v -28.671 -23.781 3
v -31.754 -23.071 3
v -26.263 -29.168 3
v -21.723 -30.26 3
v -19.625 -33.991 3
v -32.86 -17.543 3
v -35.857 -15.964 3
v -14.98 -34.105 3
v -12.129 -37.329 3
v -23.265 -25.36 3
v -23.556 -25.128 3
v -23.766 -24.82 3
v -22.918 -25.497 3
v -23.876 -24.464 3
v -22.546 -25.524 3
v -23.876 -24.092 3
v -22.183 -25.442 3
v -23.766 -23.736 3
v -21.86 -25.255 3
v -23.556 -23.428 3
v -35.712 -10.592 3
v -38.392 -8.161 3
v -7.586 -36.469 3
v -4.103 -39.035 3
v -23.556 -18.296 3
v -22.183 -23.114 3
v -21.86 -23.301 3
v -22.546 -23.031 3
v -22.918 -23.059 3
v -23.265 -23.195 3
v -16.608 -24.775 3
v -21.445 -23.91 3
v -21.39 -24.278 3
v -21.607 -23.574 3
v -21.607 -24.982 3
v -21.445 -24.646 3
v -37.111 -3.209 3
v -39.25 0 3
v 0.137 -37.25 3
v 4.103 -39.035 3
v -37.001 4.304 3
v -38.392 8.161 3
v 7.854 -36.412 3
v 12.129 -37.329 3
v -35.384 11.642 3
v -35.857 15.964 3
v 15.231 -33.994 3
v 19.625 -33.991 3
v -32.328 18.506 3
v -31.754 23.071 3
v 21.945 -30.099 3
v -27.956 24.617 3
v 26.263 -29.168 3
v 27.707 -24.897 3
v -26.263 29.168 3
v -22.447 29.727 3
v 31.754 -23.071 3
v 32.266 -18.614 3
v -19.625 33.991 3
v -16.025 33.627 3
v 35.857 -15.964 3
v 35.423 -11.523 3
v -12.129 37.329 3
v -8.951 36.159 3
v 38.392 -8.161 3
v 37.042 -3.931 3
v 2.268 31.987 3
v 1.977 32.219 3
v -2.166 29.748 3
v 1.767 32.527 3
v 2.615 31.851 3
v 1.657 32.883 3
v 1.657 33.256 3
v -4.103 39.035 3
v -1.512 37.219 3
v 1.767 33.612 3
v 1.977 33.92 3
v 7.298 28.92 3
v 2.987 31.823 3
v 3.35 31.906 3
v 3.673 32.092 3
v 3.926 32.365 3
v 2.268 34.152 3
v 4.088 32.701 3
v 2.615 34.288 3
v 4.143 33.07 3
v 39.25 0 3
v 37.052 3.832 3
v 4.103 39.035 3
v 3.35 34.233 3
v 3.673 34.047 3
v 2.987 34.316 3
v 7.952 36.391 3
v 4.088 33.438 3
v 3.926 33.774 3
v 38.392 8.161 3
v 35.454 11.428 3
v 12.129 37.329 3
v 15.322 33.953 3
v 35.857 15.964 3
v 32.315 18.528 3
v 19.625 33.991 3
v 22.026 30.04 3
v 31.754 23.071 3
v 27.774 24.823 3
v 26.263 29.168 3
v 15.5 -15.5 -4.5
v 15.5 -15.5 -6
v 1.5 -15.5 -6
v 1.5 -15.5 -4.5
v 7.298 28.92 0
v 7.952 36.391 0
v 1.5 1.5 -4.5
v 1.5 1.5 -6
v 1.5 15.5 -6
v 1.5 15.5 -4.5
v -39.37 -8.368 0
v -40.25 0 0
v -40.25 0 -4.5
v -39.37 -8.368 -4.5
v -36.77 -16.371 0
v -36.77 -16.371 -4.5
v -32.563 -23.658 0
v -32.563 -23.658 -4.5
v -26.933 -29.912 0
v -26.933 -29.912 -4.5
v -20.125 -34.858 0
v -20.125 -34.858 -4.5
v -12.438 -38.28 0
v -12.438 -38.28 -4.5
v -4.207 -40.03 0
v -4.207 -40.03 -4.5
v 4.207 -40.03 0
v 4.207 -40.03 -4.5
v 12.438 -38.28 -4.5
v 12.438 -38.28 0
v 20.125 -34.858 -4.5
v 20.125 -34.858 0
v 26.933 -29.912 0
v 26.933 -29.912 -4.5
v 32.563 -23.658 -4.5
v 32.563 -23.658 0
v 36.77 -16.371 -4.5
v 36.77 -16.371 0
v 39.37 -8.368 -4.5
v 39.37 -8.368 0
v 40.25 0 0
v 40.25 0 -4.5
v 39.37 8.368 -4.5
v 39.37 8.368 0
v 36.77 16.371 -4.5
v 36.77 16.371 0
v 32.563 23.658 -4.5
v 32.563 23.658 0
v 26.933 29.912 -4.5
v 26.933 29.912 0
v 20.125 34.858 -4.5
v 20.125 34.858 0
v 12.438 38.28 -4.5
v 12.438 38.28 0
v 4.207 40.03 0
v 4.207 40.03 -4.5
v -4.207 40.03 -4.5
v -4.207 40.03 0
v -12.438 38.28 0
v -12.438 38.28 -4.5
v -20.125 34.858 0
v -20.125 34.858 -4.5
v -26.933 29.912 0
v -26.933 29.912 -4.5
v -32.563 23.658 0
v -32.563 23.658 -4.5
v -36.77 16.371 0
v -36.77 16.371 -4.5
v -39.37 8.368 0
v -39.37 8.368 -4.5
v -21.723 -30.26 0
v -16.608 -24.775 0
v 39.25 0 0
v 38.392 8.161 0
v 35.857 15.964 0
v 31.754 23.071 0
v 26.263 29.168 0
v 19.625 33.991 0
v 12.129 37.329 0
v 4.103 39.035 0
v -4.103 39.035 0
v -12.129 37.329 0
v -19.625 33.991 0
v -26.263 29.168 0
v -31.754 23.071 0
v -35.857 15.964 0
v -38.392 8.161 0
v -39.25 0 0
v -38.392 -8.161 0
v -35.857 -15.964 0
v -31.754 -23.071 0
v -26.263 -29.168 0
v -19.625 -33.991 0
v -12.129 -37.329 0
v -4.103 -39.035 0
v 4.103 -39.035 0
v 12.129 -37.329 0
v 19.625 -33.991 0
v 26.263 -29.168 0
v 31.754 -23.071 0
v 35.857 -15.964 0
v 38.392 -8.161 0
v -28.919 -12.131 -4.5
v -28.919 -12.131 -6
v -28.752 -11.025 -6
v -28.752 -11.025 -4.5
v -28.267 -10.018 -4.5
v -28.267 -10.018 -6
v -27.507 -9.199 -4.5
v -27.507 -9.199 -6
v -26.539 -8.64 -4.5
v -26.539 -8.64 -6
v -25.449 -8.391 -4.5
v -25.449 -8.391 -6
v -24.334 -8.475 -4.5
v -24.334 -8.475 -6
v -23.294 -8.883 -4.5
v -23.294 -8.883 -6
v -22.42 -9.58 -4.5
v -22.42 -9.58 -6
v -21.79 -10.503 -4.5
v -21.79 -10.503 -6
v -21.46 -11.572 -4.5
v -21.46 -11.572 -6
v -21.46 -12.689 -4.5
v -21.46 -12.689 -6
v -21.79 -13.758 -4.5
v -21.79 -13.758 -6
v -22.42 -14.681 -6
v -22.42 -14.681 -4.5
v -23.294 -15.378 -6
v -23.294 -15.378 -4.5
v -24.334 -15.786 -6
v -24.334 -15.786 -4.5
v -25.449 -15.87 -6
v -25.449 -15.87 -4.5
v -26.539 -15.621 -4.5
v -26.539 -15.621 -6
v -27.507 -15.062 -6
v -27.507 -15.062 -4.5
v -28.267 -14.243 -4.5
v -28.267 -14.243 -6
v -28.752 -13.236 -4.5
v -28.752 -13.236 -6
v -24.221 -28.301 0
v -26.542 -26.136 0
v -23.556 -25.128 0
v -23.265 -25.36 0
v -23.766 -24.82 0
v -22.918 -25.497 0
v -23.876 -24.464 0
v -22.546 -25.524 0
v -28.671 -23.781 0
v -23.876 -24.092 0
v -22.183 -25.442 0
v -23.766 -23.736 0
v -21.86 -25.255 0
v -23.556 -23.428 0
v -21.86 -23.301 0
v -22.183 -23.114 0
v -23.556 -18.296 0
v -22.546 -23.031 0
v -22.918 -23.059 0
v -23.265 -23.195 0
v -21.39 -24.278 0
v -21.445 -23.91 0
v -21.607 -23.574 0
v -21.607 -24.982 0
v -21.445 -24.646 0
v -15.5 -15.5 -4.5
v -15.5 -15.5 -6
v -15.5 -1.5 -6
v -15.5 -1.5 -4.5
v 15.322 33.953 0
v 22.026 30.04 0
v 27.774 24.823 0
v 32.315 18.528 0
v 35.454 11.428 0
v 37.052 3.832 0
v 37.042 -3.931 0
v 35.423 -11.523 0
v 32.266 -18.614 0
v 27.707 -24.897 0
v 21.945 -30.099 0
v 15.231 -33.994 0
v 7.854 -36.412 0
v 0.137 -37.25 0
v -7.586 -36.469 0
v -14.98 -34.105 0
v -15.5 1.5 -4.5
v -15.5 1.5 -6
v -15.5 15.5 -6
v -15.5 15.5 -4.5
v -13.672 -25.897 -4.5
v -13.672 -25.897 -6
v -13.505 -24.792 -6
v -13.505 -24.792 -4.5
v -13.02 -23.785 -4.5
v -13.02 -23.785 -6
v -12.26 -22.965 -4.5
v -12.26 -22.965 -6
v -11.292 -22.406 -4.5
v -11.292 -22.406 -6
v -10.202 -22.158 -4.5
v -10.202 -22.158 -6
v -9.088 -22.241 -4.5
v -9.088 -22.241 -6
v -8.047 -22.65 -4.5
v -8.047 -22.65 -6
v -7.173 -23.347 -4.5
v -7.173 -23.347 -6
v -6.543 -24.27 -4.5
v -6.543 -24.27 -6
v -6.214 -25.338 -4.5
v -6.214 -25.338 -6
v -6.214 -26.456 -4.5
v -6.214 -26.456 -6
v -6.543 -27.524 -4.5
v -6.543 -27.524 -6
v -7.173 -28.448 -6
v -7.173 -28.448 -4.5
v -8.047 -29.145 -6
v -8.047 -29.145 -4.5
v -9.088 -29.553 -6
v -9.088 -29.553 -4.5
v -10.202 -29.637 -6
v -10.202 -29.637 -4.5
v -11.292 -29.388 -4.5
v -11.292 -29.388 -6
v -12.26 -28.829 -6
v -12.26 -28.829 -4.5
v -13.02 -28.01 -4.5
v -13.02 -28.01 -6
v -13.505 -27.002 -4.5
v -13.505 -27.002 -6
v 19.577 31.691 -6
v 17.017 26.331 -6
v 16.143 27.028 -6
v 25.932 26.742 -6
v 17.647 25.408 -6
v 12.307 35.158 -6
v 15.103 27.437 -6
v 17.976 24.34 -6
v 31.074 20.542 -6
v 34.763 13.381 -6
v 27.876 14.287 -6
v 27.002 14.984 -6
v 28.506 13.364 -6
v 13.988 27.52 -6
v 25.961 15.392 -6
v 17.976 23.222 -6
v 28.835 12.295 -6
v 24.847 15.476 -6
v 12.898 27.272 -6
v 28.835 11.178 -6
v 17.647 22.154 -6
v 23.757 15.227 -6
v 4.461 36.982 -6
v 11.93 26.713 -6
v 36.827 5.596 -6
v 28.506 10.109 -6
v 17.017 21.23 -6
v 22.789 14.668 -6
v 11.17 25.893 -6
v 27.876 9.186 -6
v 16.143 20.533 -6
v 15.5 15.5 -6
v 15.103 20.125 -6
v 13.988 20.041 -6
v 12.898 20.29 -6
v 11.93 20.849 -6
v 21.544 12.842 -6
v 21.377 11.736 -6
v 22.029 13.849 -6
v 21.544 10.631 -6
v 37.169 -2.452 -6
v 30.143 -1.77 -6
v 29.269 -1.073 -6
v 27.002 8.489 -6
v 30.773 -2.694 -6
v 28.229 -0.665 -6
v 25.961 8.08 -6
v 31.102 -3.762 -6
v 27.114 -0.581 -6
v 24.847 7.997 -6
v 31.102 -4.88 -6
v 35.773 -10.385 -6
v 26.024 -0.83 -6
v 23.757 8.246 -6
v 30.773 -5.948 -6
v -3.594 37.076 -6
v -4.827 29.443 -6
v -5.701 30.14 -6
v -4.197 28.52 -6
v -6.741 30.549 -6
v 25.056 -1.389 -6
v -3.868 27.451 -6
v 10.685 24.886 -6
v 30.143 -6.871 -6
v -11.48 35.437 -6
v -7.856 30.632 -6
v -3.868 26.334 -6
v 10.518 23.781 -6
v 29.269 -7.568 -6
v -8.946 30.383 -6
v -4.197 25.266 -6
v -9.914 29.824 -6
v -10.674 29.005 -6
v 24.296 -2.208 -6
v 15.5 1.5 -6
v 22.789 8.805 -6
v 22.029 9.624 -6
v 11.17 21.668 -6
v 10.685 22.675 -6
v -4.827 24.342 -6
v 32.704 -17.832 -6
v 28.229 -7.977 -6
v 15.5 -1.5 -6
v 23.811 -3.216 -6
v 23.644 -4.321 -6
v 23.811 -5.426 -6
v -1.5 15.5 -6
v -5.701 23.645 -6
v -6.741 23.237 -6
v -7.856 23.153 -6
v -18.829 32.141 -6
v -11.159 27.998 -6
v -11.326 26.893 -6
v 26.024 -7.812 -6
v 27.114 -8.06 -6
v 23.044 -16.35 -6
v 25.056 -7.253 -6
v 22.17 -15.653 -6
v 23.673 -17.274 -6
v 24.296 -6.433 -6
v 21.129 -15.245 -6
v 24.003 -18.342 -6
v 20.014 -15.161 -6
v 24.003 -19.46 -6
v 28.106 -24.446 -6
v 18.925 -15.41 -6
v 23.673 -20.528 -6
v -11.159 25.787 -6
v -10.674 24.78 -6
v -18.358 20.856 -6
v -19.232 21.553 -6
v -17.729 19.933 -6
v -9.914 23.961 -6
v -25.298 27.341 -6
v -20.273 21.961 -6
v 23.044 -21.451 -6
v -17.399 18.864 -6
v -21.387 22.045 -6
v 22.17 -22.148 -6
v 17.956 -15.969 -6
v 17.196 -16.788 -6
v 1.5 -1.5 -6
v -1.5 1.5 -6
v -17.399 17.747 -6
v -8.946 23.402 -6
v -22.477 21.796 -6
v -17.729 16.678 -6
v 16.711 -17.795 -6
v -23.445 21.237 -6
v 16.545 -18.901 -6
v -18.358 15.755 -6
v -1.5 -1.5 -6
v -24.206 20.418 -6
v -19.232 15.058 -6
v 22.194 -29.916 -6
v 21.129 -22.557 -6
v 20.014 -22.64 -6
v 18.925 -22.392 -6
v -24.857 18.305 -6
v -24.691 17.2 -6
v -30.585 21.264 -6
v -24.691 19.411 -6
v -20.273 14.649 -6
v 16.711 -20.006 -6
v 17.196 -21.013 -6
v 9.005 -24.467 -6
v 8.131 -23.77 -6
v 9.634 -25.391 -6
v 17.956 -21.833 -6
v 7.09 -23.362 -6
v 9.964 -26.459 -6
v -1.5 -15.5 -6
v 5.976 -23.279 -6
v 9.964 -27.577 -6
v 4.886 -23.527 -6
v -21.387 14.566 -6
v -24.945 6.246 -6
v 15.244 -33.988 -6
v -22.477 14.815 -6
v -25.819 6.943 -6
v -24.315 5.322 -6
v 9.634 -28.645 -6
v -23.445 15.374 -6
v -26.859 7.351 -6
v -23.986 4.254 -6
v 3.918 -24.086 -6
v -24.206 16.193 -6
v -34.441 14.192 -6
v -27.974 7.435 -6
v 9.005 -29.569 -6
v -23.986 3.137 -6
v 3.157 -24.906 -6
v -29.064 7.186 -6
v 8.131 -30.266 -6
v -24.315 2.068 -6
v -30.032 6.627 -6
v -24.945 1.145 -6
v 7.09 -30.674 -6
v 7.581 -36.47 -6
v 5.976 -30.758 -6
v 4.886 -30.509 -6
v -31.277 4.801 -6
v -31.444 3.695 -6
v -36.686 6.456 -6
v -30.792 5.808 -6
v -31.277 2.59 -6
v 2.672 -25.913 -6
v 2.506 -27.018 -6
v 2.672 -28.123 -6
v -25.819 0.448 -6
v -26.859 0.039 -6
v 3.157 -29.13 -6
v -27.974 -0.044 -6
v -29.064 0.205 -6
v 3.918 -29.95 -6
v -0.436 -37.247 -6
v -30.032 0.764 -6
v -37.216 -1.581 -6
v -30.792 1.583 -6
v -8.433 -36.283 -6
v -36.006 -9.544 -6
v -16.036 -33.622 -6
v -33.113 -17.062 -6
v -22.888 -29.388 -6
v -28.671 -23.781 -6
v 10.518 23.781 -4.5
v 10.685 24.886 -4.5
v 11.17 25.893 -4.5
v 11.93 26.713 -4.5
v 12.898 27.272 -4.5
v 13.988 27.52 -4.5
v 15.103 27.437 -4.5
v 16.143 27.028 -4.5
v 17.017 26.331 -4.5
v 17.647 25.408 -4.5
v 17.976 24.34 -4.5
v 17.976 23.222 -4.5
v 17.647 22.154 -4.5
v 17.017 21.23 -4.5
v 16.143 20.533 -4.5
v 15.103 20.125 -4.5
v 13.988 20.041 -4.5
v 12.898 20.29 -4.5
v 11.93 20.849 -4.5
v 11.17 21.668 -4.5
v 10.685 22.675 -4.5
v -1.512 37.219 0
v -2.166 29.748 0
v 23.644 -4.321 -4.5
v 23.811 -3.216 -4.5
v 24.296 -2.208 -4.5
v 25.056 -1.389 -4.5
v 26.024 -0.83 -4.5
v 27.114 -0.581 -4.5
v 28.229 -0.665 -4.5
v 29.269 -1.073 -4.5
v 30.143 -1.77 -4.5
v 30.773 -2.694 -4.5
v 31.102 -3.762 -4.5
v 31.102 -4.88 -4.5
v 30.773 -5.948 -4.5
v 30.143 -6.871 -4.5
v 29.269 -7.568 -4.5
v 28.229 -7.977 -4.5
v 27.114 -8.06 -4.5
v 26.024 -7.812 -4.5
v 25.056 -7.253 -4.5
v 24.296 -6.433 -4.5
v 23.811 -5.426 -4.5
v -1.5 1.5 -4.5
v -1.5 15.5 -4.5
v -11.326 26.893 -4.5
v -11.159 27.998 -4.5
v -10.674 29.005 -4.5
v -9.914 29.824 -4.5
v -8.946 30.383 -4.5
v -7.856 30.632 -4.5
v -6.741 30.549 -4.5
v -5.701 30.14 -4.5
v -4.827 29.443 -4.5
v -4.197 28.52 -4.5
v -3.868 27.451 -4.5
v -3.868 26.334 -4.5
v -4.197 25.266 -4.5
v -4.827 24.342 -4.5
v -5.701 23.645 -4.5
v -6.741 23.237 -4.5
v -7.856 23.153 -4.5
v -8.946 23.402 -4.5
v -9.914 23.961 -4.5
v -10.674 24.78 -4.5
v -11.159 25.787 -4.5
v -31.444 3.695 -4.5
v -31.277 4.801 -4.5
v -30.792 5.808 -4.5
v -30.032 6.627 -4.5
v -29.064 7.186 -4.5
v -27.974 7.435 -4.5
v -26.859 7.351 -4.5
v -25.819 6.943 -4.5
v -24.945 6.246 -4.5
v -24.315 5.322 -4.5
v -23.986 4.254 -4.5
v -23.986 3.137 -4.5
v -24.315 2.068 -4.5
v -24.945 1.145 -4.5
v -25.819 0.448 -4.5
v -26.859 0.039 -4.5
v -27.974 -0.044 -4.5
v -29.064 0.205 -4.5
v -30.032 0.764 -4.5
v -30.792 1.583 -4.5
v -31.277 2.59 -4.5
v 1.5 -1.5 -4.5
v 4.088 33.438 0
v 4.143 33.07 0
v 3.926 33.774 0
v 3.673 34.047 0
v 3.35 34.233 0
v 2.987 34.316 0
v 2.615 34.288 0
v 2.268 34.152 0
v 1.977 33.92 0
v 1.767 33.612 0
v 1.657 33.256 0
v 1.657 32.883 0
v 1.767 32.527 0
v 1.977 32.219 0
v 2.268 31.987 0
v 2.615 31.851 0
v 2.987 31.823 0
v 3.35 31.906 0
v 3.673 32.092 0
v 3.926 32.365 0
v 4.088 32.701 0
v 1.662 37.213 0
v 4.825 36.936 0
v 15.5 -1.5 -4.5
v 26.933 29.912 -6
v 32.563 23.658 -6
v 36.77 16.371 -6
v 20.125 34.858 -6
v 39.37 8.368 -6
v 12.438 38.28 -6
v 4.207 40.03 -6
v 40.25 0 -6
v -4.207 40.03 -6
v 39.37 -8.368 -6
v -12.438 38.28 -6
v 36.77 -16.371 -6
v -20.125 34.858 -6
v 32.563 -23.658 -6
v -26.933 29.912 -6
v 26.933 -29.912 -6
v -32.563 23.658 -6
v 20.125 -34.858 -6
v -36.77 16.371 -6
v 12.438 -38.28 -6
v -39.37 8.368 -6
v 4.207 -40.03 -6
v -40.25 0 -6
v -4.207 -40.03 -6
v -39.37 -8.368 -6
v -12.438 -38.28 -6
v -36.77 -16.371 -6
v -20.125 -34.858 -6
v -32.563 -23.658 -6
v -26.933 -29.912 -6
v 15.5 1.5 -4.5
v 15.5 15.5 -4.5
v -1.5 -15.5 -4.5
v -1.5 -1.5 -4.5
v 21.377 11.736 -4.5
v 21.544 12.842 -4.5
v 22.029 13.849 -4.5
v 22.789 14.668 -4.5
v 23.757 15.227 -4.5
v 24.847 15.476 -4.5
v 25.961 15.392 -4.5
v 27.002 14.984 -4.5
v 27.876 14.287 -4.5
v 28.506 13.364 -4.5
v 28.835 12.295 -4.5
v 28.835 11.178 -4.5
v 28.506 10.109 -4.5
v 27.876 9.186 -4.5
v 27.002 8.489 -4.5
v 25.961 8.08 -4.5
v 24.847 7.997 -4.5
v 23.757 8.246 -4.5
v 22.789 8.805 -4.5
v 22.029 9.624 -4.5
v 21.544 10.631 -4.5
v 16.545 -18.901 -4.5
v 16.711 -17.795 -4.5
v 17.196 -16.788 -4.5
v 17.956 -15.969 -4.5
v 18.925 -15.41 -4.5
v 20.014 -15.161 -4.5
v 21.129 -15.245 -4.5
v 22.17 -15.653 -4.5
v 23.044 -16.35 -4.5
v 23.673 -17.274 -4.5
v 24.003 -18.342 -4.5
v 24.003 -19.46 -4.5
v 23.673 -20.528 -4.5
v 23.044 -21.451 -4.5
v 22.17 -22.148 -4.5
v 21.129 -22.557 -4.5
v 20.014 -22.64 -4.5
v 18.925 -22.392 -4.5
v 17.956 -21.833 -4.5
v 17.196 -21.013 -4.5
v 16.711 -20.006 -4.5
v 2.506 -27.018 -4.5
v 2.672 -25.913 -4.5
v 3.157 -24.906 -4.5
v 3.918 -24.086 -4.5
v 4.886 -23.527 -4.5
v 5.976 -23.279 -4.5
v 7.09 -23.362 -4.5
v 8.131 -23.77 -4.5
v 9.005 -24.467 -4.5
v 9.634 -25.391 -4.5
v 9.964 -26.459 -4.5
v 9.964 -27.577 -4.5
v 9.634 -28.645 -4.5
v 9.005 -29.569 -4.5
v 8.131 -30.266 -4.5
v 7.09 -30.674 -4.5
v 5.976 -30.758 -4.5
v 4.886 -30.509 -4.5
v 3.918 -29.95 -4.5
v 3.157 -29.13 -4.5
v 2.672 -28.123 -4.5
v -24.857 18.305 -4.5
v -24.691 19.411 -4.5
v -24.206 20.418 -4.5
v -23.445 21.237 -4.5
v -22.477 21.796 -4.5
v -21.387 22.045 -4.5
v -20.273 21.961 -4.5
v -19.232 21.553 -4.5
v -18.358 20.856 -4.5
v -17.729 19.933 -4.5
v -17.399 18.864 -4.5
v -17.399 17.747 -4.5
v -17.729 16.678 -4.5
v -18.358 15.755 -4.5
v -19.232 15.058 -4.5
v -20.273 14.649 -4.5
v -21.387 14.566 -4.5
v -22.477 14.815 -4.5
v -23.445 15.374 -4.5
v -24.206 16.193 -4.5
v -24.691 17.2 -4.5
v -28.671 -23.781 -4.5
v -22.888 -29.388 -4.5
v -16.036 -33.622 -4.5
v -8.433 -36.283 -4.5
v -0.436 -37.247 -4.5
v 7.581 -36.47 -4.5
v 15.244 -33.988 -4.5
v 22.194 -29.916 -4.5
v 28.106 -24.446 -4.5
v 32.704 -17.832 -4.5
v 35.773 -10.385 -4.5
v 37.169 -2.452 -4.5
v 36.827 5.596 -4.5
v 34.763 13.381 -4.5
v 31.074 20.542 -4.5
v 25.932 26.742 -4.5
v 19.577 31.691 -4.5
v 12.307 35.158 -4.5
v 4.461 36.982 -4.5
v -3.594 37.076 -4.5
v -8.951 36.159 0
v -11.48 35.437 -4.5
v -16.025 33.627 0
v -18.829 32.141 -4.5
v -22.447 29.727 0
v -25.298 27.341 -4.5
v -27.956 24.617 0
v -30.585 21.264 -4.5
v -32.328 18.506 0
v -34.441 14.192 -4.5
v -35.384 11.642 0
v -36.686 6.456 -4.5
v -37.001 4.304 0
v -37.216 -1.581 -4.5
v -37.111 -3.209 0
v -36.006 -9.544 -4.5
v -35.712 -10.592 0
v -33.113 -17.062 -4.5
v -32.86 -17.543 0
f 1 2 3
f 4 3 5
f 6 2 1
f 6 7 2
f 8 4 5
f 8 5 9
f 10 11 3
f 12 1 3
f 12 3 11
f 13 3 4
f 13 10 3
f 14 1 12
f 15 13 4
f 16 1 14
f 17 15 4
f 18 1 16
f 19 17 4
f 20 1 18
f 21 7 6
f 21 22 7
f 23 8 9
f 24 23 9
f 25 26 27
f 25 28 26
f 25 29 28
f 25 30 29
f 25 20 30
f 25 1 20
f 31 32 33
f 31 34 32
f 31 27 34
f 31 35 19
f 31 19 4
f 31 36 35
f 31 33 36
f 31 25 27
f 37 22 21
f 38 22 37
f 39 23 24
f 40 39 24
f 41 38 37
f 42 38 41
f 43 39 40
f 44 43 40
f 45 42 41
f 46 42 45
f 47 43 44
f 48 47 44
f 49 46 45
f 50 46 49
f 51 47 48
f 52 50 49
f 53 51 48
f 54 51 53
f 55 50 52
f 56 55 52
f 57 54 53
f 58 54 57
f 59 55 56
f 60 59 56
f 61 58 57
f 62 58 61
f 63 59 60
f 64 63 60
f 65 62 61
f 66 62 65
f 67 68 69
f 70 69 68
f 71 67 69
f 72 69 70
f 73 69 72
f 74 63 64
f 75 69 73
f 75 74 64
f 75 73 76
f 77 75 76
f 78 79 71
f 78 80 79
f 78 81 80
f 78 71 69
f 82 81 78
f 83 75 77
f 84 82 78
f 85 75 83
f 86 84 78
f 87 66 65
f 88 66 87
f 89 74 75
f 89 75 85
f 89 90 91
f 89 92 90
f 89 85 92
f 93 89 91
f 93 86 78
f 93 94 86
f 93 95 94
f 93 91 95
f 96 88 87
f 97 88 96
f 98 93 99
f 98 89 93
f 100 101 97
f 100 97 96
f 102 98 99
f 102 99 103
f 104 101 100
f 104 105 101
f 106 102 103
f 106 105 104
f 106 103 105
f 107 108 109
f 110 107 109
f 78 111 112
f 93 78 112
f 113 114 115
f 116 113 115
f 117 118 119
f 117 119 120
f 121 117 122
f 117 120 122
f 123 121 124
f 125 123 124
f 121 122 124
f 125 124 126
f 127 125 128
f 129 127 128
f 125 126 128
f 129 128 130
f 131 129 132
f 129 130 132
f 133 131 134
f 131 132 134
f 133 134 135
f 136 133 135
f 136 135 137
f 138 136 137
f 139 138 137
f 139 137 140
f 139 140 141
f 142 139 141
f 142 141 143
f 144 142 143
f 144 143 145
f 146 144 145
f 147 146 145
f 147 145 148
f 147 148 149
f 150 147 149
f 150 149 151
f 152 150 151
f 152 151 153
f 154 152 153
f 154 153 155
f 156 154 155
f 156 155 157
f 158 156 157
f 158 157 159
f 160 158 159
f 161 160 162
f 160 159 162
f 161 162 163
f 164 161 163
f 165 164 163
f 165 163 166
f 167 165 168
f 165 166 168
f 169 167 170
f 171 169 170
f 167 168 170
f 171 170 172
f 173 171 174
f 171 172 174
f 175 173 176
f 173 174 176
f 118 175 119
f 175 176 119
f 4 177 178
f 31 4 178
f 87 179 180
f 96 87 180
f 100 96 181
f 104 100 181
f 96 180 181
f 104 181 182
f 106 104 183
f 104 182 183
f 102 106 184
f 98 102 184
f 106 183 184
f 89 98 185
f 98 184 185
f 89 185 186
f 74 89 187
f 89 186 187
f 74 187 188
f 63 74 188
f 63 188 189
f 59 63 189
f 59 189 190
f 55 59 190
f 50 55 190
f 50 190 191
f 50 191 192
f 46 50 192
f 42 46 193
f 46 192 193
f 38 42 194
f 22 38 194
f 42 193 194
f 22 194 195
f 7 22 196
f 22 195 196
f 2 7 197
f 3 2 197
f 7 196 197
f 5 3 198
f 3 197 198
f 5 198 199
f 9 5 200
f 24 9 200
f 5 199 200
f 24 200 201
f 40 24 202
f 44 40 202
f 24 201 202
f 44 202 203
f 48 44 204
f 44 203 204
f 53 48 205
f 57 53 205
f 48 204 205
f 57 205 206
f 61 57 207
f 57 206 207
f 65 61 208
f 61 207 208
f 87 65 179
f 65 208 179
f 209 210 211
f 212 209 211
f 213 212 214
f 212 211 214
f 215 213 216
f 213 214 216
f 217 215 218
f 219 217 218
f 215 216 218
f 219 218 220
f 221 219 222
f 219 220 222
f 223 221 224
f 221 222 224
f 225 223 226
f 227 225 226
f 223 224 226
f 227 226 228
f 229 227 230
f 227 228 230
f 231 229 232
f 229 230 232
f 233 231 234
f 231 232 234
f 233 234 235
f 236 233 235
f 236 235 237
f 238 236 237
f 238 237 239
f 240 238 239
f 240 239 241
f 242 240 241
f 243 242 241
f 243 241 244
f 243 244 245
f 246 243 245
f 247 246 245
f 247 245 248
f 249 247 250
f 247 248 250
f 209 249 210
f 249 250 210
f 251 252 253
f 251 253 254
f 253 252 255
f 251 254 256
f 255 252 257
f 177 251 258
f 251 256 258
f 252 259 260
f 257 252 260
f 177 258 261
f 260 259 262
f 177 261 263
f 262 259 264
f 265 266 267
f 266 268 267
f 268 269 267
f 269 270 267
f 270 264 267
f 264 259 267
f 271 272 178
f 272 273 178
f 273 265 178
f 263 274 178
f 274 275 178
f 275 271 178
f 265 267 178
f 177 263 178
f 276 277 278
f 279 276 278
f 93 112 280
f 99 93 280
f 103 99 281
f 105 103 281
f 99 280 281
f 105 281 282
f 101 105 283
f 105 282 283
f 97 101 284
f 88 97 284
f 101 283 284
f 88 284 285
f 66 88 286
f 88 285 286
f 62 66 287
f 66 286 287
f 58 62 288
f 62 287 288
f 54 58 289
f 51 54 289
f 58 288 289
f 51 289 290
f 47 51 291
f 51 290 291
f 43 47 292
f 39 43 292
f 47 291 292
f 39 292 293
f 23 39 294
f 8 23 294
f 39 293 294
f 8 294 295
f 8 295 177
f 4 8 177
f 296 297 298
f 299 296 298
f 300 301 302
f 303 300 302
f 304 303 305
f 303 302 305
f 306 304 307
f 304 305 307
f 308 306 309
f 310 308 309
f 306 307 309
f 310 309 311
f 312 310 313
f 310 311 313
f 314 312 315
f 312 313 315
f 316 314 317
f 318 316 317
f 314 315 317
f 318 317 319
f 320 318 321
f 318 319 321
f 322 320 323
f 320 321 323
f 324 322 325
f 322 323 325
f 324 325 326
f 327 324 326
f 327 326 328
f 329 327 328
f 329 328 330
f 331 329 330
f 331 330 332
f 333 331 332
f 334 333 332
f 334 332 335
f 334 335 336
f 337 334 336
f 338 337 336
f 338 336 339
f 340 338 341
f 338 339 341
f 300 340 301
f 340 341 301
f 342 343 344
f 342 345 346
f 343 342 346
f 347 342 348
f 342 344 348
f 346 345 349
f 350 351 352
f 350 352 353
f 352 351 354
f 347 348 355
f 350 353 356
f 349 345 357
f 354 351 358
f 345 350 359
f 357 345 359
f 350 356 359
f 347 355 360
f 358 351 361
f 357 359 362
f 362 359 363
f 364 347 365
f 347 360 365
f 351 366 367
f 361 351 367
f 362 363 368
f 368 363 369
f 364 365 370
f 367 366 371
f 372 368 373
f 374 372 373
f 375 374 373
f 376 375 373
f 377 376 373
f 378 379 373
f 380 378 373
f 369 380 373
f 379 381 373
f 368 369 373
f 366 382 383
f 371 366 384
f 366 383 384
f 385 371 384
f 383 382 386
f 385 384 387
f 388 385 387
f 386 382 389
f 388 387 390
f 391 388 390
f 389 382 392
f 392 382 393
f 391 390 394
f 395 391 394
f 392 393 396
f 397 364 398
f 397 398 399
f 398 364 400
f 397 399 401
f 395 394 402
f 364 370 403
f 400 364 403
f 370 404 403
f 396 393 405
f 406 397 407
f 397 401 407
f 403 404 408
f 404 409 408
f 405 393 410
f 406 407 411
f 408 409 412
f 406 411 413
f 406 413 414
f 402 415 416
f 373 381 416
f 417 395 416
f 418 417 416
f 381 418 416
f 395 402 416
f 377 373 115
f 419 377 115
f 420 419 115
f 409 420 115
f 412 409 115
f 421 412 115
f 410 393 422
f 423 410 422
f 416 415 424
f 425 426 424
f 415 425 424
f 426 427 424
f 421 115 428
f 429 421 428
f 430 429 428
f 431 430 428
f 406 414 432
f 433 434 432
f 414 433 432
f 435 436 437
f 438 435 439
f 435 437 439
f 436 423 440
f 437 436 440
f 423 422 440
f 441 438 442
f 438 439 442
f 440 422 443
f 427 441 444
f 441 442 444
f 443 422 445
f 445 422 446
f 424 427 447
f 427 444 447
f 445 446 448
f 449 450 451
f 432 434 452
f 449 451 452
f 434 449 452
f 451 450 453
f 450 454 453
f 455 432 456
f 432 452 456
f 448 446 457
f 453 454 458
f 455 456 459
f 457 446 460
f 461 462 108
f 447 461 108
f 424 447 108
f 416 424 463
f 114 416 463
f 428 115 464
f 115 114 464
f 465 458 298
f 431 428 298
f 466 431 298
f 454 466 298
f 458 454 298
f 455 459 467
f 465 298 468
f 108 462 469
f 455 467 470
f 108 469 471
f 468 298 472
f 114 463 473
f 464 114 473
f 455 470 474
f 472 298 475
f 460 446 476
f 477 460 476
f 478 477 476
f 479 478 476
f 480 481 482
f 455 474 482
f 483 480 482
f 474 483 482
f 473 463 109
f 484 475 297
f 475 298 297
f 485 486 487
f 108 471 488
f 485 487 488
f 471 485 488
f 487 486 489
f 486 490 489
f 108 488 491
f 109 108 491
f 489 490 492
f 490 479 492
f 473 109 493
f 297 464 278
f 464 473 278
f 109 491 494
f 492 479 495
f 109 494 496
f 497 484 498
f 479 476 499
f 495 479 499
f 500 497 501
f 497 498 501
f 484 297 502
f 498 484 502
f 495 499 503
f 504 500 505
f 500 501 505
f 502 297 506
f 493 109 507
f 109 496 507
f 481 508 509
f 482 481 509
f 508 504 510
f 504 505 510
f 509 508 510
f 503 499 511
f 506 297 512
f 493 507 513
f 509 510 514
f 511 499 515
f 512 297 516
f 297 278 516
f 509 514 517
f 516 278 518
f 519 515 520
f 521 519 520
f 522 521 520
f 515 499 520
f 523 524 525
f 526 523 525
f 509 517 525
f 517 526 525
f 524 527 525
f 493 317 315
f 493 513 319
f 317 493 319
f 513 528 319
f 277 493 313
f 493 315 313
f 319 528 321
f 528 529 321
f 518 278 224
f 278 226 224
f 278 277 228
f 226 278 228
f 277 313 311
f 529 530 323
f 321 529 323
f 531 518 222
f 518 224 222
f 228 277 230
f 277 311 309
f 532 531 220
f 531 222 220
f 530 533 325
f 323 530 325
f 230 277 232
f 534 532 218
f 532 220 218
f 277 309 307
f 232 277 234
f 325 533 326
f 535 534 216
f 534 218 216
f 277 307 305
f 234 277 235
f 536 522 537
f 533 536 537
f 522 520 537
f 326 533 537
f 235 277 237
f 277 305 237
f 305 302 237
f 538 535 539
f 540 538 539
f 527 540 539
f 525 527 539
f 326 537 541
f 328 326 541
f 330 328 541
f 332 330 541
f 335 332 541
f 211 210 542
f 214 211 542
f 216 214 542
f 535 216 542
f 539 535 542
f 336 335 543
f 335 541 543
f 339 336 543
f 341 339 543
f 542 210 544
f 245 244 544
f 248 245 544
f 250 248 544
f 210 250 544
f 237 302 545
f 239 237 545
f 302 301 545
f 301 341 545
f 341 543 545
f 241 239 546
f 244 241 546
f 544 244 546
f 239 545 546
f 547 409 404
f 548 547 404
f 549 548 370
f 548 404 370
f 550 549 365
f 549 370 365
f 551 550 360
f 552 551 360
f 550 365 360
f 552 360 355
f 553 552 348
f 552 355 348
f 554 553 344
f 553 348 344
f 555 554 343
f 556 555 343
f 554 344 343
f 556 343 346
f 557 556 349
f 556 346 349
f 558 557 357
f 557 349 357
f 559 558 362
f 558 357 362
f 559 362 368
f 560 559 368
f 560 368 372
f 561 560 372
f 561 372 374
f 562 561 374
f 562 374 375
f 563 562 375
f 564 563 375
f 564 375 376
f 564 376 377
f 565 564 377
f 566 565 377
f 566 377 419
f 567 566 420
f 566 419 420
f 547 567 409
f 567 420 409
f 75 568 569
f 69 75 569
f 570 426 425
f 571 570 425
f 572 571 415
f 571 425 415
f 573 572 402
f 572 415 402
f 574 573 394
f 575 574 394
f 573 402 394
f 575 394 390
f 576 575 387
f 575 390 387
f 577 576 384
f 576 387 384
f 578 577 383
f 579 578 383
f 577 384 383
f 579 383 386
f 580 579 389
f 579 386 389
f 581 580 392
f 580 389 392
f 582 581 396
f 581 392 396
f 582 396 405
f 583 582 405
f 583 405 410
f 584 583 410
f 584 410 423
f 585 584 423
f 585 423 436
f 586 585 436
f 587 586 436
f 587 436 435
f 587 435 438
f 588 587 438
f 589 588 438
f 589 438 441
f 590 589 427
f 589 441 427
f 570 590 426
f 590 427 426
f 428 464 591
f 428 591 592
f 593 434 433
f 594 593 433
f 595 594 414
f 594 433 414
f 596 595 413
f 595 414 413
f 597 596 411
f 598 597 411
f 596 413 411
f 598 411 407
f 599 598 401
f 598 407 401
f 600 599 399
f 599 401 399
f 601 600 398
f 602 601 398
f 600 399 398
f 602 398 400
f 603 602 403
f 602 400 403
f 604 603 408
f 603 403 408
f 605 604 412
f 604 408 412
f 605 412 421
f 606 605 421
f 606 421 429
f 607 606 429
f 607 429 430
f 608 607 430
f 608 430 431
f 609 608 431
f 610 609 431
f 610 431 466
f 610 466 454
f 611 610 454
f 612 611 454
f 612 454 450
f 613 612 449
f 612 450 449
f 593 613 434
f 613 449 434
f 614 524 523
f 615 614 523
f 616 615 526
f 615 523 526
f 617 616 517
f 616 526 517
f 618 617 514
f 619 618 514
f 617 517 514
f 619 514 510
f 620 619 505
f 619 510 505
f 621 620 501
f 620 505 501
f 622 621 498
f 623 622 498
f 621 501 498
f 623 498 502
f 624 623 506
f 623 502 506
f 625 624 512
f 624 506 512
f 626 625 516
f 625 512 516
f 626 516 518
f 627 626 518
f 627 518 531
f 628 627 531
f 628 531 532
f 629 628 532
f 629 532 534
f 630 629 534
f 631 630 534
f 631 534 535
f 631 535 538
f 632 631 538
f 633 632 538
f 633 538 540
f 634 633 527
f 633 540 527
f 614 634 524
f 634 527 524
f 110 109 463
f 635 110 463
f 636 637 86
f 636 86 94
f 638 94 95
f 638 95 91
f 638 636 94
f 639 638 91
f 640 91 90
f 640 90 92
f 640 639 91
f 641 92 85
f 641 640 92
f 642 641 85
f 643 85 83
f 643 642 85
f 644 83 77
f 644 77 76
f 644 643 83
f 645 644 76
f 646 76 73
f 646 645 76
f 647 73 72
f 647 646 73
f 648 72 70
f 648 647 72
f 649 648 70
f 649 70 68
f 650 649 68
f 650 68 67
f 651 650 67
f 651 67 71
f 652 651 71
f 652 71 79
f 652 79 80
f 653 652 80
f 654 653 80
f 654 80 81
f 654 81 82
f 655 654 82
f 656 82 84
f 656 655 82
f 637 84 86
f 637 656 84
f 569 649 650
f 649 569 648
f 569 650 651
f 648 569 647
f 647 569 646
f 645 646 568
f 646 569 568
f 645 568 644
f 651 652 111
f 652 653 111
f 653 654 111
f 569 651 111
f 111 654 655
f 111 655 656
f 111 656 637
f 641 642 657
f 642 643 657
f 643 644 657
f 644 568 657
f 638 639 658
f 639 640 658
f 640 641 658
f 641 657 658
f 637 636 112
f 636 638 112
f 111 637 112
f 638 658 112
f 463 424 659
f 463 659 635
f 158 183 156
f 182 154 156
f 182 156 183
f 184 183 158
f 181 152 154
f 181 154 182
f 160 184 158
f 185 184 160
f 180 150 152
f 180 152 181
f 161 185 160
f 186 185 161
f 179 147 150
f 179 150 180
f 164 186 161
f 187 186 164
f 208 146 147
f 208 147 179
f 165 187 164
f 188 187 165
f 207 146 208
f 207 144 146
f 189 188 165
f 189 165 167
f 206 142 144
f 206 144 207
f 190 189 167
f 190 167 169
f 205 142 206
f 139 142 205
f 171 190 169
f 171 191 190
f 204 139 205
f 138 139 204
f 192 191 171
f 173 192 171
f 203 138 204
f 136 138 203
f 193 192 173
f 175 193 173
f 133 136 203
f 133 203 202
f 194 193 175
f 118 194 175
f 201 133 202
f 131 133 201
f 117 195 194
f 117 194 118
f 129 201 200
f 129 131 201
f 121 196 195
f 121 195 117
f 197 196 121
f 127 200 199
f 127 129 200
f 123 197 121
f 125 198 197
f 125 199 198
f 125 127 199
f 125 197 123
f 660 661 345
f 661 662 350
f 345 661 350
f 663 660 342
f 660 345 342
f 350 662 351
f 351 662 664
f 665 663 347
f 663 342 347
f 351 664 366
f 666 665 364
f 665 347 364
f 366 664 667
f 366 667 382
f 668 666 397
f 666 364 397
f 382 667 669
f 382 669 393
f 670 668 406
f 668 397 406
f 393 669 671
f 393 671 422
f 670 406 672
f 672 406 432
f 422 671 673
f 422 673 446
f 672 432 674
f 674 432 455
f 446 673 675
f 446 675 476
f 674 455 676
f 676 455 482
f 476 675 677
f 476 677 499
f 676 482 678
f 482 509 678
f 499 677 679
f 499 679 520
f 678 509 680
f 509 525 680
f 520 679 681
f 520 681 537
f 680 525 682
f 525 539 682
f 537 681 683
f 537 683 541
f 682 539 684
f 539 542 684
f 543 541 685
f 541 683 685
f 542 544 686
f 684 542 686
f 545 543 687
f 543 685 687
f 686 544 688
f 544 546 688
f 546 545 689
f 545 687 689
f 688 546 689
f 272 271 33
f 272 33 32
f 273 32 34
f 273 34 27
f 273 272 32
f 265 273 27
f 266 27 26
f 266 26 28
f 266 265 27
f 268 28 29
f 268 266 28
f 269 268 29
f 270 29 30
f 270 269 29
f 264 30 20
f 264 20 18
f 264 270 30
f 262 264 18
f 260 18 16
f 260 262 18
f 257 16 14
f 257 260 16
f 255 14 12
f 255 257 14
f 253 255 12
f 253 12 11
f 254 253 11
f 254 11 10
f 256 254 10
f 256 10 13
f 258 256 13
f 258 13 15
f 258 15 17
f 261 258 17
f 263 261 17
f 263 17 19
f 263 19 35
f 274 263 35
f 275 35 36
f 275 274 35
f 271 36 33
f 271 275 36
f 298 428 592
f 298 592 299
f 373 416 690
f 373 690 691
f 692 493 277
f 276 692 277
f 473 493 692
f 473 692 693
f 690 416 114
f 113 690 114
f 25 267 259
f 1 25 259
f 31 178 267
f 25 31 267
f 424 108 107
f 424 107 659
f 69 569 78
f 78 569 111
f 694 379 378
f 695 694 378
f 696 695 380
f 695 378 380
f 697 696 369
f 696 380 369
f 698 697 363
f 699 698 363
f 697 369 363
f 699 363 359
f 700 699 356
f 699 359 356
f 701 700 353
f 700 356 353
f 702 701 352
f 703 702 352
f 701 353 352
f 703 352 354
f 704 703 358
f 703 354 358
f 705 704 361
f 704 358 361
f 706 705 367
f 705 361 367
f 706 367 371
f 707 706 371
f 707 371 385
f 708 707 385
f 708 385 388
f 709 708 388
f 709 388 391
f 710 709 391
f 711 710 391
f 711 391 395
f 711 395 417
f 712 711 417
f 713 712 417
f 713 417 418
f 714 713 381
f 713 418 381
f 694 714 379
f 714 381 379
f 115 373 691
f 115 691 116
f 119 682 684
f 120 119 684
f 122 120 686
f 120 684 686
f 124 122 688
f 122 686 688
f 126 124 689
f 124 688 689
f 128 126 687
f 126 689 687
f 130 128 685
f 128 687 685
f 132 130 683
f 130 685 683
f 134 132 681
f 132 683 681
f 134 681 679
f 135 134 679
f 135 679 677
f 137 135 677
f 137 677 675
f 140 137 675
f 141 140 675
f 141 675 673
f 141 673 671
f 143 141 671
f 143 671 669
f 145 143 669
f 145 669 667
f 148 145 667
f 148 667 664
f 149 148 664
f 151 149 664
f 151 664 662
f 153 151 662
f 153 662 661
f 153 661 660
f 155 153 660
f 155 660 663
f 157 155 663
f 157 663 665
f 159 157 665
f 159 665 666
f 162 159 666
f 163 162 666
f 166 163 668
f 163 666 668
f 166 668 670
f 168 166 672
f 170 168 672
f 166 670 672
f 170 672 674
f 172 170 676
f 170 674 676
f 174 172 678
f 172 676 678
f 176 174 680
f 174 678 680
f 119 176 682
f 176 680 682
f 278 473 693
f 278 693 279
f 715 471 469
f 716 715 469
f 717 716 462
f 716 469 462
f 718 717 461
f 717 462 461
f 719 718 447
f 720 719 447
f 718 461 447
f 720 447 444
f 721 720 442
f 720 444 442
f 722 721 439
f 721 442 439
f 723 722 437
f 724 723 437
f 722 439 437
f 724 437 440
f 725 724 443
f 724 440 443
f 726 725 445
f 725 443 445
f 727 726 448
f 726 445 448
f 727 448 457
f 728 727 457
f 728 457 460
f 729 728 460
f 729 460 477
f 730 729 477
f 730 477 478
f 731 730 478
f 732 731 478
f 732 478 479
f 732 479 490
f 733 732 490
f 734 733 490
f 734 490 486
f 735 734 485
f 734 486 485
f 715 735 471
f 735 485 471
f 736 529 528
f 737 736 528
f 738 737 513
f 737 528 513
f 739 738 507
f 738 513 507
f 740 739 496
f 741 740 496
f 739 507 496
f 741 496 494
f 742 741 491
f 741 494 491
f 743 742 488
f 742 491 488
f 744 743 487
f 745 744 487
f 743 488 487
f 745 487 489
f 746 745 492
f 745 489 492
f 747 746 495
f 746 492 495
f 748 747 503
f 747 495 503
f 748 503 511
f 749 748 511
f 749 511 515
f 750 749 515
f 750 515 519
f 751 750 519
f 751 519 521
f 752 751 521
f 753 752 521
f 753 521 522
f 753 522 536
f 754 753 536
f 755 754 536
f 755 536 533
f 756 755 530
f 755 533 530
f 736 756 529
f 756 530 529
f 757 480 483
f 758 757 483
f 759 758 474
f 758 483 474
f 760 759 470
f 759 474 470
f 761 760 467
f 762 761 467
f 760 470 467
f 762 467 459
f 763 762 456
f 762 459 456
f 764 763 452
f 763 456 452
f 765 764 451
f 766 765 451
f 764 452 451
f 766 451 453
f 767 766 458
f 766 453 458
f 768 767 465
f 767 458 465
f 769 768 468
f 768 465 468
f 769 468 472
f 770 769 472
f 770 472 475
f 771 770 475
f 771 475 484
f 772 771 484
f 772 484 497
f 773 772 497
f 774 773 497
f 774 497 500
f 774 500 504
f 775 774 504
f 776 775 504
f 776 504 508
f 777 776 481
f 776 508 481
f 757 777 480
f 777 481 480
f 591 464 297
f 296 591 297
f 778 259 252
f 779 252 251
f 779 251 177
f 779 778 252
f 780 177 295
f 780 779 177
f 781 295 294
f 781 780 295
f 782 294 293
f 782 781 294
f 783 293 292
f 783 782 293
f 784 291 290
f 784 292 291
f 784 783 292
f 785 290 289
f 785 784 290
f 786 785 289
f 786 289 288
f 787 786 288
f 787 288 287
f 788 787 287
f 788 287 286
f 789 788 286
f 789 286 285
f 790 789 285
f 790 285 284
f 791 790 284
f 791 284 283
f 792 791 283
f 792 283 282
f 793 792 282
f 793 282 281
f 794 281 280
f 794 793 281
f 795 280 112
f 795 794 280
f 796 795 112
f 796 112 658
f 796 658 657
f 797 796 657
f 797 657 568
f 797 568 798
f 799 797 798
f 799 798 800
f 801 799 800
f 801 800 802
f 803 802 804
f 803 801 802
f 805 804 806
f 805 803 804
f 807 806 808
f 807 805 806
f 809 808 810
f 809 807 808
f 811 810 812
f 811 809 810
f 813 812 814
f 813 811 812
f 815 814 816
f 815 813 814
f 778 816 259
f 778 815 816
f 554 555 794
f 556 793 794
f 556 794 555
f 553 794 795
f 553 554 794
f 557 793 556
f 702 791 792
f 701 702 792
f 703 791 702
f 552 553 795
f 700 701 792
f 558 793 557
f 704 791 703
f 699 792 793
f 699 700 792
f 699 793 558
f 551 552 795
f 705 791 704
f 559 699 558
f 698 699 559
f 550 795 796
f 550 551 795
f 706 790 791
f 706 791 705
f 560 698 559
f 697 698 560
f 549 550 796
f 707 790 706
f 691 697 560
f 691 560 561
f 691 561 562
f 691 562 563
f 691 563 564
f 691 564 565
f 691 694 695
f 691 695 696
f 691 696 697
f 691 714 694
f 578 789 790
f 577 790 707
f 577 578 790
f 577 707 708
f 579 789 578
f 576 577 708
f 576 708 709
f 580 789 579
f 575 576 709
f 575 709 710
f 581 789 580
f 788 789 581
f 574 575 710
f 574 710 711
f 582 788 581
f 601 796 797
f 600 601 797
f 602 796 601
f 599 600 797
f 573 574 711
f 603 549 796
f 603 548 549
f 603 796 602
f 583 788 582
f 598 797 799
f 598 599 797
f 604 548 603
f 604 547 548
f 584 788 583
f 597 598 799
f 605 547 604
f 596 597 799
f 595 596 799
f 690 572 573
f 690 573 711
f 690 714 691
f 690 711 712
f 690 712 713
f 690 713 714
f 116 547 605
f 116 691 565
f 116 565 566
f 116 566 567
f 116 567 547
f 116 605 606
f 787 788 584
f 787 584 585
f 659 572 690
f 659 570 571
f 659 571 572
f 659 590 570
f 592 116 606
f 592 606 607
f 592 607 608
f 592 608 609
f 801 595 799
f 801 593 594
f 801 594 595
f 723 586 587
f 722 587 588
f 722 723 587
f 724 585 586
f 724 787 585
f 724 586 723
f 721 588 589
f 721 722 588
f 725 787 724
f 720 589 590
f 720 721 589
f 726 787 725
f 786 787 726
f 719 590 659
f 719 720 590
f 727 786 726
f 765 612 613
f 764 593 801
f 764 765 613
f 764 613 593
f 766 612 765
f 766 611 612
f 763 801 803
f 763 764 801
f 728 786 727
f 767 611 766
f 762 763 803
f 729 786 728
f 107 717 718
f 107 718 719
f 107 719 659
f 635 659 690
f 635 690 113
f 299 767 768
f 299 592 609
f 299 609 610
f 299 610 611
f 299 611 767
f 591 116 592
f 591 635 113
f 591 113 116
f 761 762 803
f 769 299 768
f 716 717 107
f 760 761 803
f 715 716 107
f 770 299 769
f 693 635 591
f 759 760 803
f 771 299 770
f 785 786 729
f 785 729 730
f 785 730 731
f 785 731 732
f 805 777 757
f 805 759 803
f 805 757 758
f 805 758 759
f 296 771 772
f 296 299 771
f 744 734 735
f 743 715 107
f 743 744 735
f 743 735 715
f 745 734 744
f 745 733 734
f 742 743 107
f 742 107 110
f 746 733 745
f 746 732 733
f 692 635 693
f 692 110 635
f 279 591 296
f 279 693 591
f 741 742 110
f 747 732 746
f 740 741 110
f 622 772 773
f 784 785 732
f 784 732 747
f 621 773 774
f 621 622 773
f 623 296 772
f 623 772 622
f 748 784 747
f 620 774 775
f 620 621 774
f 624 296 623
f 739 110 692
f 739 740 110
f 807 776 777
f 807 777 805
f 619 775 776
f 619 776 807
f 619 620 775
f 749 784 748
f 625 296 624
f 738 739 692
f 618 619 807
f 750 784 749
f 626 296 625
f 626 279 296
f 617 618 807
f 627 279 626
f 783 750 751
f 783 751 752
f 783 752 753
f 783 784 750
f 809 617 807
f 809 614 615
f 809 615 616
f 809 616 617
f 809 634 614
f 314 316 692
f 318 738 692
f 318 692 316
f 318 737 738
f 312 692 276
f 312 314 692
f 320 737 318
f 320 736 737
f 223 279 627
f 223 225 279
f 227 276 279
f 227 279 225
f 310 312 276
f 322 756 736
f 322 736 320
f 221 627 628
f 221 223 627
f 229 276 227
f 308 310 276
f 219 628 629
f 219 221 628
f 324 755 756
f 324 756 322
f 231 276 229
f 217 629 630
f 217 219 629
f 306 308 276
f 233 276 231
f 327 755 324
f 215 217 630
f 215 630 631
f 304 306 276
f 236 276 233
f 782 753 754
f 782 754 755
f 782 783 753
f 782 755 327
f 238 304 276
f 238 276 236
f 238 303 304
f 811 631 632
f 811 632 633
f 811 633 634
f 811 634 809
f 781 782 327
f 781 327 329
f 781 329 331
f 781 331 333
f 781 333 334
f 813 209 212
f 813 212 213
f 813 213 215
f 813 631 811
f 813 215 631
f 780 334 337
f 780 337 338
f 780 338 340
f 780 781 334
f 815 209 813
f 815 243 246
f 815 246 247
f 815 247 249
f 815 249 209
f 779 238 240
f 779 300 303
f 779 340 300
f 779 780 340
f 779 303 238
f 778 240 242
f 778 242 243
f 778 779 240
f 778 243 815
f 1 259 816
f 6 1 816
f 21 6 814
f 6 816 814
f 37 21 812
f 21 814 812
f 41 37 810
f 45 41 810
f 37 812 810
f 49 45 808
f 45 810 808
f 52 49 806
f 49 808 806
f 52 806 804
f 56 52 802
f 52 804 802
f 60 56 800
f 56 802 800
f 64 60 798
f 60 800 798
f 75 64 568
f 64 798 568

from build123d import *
from build123d.topology import SkipClean

# Parameters (mm, degrees)
SKETCH2_R           = 39.25
SKETCH2_R_2         = 1.25
BOSS_EXTRUDE1_DEPTH = 3
BOSS_EXTRUDE2_START = -6
SKETCH3_R           = 40.25
SKETCH3_R_2         = 37.25
SKETCH3_R_3         = 1.25
BOSS_EXTRUDE2_DEPTH = 6
SKETCH4_R           = 40.25
BOSS_EXTRUDE3_DEPTH = 1.5
SKETCH5_W           = 14
SKETCH5_H           = 14
CUT_EXTRUDE1_DEPTH  = 1.5
SKETCH7_R           = 3.75
CUT_EXTRUDE2_DEPTH  = 1.5


with BuildPart() as part:
    # Sketch2 → Boss-Extrude1 (new body)
    with BuildSketch(Plane(origin=(0, 0, 0), x_dir=(0, 1, 0), z_dir=(0, 0, 1))):
        with Locations(Location((0, 0, 0), (0, 0, 270))):
            Circle(SKETCH2_R)
        with BuildLine():
            Line((-18.29588, 23.55599), (-23.781033, 28.670978))
            ThreePointArc((-23.781033, 28.670978), (15.15094, 34.029568), (37.219306, 1.511877))
            Line((37.219306, 1.511877), (29.747846, 2.165545))
            Line((29.747846, 2.165545), (28.919866, -7.298305))
            Line((28.919866, -7.298305), (36.391326, -7.951973))
            ThreePointArc((36.391326, -7.951973), (-15.15094, -34.029568), (-30.260018, 21.723117))
            Line((-30.260018, 21.723117), (-24.774865, 16.60813))
            Line((-24.774865, 16.60813), (-18.29588, 23.55599))
        make_face(mode=Mode.SUBTRACT)
        with Locations(Location((-24.277949, 22.639554, 0), (0, 0, 270))):
            Circle(SKETCH2_R_2, mode=Mode.SUBTRACT)
        with Locations(Location((33.069586, -2.893214, 0), (0, 0, 270))):
            Circle(SKETCH2_R_2, mode=Mode.SUBTRACT)
    extrude(amount=BOSS_EXTRUDE1_DEPTH)

    # Sketch3 → Boss-Extrude2 (add)
    # profile 1 of 3: a face of its own
    with SkipClean():  # the faces are left unmerged after this step: merging them gives an invalid solid
        with BuildSketch(Plane.XY.offset(BOSS_EXTRUDE2_START)):
            with Locations(Location((0, 0, 0), (0, 0, 180))):
                Circle(SKETCH3_R)
            with Locations(Location((0, 0, 0), (0, 0, 219.67388))):
                Circle(SKETCH3_R_2, mode=Mode.SUBTRACT)
        # profile 2 of 3: a face of its own
        with BuildSketch(Plane.XY.offset(BOSS_EXTRUDE2_START)):
            with Locations((2.893214, 33.069586)):
                Circle(SKETCH3_R_3)
        # profile 3 of 3: a face of its own
        with BuildSketch(Plane.XY.offset(BOSS_EXTRUDE2_START)):
            with Locations((-22.639554, -24.277949)):
                Circle(SKETCH3_R_3)
        extrude(amount=BOSS_EXTRUDE2_DEPTH)


with BuildPart() as boss_extrude2_kept_piece:
    # of the separate pieces the step leaves, the one the design keeps (boss_extrude2_pieces_kept)
    add(part.part.solids().sort_by_distance((39.25, 0, 0))[0])

    # Sketch4 → Boss-Extrude3 (add)
    with SkipClean():  # the faces are left unmerged after this step: merging them gives an invalid solid
        with BuildSketch(Plane.XY.offset(-6)):
            with Locations(Location((0, 0, 0), (0, 0, 180))):
                Circle(SKETCH4_R)
        extrude(amount=BOSS_EXTRUDE3_DEPTH)

    # Sketch5 → Cut-Extrude1 (cut)
    with SkipClean():  # the faces are left unmerged after this step: merging them gives an invalid solid
        with BuildSketch(Plane(origin=(0, 0, -6), x_dir=(-1, 0, 0), z_dir=(0, 0, -1))):
            with Locations((-8.5, -8.5)):
                Rectangle(SKETCH5_W, SKETCH5_H)
            with Locations((-8.5, 8.5)):
                Rectangle(SKETCH5_W, SKETCH5_H)
            with Locations((8.5, 8.5)):
                Rectangle(SKETCH5_W, SKETCH5_H)
            with Locations((8.5, -8.5)):
                Rectangle(SKETCH5_W, SKETCH5_H)
        extrude(amount=-CUT_EXTRUDE1_DEPTH, mode=Mode.SUBTRACT)

    # Sketch7 → Cut-Extrude2 (cut)
    with SkipClean():  # the faces are left unmerged after this step: merging them gives an invalid solid
        with BuildSketch(Plane(origin=(0, 0, -6), x_dir=(-1, 0, 0), z_dir=(0, 0, -1))):
            with Locations((-25.126958, 11.736458)):
                Circle(SKETCH7_R)
            with Locations((-27.394136, -4.320851)):
                Circle(SKETCH7_R)
            with Locations((-20.294579, -18.900755)):
                Circle(SKETCH7_R)
            with Locations((-6.2558, -27.01802)):
                Circle(SKETCH7_R)
            with Locations((9.921992, -25.897153)):
                Circle(SKETCH7_R)
            with Locations((25.168506, -12.130508)):
                Circle(SKETCH7_R)
            with Locations((27.693803, 3.695429)):
                Circle(SKETCH7_R)
            with Locations((21.107164, 18.305479)):
                Circle(SKETCH7_R)
            with Locations((7.575753, 26.892581)):
                Circle(SKETCH7_R)
            with Locations((-14.268248, 23.780781)):
                Circle(SKETCH7_R)
        extrude(amount=-CUT_EXTRUDE2_DEPTH, mode=Mode.SUBTRACT)


solid = boss_extrude2_kept_piece.part
